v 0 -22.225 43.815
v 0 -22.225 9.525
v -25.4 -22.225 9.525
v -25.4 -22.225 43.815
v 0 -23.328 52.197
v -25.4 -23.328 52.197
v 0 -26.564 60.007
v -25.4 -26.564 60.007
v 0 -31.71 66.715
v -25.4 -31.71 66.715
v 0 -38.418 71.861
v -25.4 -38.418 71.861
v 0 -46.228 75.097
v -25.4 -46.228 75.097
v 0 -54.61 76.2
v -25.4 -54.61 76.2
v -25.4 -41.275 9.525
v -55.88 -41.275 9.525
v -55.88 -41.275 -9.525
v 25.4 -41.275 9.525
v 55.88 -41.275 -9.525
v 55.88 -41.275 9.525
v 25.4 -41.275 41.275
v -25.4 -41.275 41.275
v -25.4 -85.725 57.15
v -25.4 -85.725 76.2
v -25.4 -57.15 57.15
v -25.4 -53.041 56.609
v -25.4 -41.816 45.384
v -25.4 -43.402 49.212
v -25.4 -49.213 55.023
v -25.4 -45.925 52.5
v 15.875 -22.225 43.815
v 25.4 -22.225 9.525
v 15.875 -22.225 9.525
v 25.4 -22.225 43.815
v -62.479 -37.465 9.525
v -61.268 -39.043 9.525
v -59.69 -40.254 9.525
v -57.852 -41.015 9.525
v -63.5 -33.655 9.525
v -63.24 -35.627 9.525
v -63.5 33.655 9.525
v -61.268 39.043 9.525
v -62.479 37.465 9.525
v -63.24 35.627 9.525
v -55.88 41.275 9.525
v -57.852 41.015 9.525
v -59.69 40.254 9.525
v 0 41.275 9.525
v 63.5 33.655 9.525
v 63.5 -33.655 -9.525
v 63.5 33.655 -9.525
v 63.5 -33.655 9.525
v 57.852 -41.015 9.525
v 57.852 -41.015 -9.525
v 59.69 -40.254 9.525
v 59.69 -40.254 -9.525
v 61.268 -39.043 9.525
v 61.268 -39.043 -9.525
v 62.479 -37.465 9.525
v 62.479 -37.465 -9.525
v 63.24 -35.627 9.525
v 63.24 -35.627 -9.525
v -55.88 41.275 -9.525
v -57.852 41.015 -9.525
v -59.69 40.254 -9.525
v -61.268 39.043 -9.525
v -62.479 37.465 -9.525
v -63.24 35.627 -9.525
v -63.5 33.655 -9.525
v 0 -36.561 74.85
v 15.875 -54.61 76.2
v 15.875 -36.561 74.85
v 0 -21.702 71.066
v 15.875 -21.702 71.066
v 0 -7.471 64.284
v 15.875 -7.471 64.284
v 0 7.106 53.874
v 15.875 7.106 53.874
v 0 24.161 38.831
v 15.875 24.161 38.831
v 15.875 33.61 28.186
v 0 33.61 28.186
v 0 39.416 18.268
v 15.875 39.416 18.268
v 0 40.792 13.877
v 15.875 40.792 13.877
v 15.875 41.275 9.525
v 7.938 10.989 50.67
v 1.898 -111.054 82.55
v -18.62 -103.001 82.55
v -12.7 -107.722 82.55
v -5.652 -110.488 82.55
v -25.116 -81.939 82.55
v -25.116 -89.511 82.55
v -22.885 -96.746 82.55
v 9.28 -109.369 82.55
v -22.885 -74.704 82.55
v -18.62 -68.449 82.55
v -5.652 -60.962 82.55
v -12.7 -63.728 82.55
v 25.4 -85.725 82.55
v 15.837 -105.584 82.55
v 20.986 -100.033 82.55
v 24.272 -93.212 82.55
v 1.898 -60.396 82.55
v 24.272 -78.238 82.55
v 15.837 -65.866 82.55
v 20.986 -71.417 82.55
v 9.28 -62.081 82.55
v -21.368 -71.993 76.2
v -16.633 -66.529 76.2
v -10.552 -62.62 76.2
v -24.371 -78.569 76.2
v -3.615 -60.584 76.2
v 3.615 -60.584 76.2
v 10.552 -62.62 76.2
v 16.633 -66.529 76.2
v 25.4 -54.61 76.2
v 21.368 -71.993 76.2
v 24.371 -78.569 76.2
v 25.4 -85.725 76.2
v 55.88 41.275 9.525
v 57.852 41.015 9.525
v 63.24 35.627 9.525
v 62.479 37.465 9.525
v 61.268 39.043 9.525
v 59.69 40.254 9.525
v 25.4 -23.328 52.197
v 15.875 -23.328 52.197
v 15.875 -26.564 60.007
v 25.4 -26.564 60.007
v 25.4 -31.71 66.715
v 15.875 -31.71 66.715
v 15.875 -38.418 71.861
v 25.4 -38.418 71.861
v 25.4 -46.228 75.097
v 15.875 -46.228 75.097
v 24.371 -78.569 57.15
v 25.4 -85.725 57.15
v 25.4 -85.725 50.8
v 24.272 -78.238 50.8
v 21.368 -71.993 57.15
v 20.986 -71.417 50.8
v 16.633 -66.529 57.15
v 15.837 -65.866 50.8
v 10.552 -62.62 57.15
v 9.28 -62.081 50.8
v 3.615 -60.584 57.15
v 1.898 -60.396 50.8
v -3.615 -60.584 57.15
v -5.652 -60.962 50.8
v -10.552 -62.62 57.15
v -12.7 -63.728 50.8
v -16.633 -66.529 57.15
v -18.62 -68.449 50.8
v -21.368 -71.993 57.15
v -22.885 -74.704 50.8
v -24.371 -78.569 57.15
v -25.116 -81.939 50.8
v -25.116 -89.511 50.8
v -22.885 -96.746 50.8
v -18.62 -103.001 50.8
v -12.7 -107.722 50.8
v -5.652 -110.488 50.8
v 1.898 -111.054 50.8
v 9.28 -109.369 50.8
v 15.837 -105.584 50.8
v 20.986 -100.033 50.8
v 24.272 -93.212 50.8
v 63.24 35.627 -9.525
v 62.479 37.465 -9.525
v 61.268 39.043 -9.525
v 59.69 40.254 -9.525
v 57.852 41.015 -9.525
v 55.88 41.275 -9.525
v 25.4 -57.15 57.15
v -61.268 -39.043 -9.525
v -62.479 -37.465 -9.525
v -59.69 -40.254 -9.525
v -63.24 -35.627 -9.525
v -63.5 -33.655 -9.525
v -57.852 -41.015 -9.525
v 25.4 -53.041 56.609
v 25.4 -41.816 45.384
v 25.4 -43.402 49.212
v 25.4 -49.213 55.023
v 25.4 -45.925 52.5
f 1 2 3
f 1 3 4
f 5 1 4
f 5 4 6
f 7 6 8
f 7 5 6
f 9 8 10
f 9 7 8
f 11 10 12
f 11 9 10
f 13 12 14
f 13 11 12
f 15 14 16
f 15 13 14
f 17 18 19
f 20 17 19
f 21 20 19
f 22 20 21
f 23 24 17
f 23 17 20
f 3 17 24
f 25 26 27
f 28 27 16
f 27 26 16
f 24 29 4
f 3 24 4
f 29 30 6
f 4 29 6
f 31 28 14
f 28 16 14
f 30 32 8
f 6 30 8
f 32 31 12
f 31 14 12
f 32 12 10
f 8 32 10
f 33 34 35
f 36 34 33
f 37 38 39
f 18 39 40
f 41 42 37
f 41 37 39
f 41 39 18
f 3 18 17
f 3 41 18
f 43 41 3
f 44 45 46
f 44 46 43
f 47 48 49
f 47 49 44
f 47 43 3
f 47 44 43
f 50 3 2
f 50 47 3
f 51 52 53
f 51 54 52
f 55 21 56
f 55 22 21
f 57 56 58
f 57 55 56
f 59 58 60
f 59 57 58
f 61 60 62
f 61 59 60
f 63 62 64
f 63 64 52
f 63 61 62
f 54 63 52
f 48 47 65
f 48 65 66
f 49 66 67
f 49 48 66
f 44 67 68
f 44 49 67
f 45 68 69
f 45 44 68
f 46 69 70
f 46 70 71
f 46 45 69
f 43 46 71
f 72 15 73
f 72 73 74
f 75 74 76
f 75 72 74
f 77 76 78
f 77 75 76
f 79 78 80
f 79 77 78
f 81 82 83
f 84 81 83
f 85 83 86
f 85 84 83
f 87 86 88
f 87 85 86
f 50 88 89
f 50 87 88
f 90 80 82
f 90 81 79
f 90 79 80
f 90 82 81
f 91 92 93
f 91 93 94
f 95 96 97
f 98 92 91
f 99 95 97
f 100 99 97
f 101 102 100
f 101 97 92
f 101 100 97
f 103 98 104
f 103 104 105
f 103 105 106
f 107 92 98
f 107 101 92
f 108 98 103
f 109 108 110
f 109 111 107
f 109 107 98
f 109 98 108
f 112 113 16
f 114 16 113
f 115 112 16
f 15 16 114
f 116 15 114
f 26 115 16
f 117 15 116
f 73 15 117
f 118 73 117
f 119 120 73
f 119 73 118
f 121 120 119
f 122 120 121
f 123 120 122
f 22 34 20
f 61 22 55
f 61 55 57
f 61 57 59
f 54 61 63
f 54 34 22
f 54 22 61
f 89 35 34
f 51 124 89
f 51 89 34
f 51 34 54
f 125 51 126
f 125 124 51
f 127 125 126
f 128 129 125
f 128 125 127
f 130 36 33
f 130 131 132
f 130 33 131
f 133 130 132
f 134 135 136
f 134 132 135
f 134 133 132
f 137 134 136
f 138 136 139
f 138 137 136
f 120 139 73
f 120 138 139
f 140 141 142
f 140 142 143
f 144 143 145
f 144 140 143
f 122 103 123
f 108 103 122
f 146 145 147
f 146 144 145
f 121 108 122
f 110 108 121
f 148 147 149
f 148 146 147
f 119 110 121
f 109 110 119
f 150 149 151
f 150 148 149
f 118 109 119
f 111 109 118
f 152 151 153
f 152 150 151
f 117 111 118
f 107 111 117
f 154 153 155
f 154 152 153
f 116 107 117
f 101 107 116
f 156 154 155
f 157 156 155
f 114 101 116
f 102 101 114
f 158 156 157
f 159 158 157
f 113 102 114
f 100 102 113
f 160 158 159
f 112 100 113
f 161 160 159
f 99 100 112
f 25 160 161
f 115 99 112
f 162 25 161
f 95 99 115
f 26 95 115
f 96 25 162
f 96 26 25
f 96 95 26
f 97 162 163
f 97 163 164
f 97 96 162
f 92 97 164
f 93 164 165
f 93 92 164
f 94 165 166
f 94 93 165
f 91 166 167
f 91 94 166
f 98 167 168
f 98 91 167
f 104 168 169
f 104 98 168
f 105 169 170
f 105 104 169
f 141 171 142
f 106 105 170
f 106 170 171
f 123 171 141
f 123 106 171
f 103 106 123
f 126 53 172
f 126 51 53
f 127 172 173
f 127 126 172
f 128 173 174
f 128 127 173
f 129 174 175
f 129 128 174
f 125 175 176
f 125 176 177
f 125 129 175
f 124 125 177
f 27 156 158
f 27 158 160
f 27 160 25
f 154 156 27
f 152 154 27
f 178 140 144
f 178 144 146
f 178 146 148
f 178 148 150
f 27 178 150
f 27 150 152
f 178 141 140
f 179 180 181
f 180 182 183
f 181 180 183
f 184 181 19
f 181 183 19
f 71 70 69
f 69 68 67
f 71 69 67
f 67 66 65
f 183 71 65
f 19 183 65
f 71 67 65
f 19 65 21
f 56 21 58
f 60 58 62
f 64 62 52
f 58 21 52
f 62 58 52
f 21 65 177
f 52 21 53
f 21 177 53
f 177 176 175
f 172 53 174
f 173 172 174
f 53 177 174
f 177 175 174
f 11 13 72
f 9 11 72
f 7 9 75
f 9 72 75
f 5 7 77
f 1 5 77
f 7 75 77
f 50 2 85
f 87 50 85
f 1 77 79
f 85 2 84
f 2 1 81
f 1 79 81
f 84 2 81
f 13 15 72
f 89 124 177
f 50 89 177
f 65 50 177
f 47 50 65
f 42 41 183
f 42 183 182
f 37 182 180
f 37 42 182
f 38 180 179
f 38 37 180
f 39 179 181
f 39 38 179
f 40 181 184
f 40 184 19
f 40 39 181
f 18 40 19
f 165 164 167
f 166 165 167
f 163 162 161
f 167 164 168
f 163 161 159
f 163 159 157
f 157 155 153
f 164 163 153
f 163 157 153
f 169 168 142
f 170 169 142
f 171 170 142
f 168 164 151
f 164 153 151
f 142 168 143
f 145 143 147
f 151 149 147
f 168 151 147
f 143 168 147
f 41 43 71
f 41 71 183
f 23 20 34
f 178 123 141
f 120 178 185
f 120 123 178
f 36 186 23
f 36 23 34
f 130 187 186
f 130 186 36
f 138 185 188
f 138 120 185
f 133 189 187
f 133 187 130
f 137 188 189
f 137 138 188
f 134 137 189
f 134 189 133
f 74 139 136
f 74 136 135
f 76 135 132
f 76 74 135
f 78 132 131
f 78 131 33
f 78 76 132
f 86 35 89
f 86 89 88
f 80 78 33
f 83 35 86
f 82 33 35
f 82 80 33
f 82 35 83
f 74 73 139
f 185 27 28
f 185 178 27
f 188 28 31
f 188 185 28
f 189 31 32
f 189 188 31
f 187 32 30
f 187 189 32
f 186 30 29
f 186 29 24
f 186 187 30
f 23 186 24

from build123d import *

# Parameters (mm, degrees)
F1_DEPTH = 9.525
F3_DEPTH = 25.4
F5_R     = 25.4
F6_DEPTH = 15.875
F8_DEPTH = 15.875


with BuildPart() as f1:
    # F0 (on Top) → F1 (new body, symmetric)
    with BuildSketch(Plane.XY):
        with BuildLine():
            ThreePointArc((63.5, 33.655), (61.2681536726, 39.0431536726), (55.88, 41.275))
            Line((55.88, 41.275), (-55.88, 41.275))
            ThreePointArc((-55.88, 41.275), (-61.2681536726, 39.0431536726), (-63.5, 33.655))
            Line((-63.5, 33.655), (-63.5, -33.655))
            ThreePointArc((-63.5, -33.655), (-61.2681536726, -39.0431536726), (-55.88, -41.275))
            Line((-55.88, -41.275), (55.88, -41.275))
            ThreePointArc((55.88, -41.275), (61.2681536726, -39.0431536726), (63.5, -33.655))
            Line((63.5, -33.655), (63.5, 33.655))
        make_face()
    extrude(amount=F1_DEPTH, both=True)

    # F2 (on Right) → F3 (join, symmetric)
    with BuildSketch(Plane.YZ):
        with BuildLine():
            Line((-41.275, 9.525), (-22.225, 9.525))
            Line((-22.225, 9.525), (-22.225, 43.815))
            ThreePointArc((-22.225, 43.815), (-31.7103468913, 66.7146531087), (-54.61, 76.2))
            Line((-54.61, 76.2), (-85.725, 76.2))
            Line((-85.725, 76.2), (-85.725, 57.15))
            Line((-85.725, 57.15), (-57.15, 57.15))
            ThreePointArc((-57.15, 57.15), (-45.9246798487, 52.5003201513), (-41.275, 41.275))
            Line((-41.275, 41.275), (-41.275, 9.525))
        make_face()
    extrude(amount=F3_DEPTH, both=True)

    # F5 (on mid) → F6 (join, symmetric)
    with BuildSketch(Plane.XY.offset(66.675)):
        with Locations((0, -85.725)):
            Circle(F5_R)
    extrude(amount=F6_DEPTH, both=True)

    # F7 (on Right) → F8 (join)
    with BuildSketch(Plane.YZ):
        with BuildLine():
            ThreePointArc((-54.61, 76.2), (-31.7103468913, 66.7146531087), (-22.225, 43.815))
            Line((-22.225, 43.815), (-22.225, 9.525))
            Line((-22.225, 9.525), (41.275, 9.525))
            add(Edge.make_bspline(
                [(-54.61, 76.2), (-22.4902851436, 76.2), (7.474900406, 55.7835251702), (41.275, 23.4287642155), (41.275, 9.525)],
                knots=[0, 0, 0, 0, 0.4371907779, 0.8096505074, 0.8096505074, 0.8096505074, 0.8096505074], degree=3))
        make_face()
    extrude(amount=F8_DEPTH)


solid = f1.part
